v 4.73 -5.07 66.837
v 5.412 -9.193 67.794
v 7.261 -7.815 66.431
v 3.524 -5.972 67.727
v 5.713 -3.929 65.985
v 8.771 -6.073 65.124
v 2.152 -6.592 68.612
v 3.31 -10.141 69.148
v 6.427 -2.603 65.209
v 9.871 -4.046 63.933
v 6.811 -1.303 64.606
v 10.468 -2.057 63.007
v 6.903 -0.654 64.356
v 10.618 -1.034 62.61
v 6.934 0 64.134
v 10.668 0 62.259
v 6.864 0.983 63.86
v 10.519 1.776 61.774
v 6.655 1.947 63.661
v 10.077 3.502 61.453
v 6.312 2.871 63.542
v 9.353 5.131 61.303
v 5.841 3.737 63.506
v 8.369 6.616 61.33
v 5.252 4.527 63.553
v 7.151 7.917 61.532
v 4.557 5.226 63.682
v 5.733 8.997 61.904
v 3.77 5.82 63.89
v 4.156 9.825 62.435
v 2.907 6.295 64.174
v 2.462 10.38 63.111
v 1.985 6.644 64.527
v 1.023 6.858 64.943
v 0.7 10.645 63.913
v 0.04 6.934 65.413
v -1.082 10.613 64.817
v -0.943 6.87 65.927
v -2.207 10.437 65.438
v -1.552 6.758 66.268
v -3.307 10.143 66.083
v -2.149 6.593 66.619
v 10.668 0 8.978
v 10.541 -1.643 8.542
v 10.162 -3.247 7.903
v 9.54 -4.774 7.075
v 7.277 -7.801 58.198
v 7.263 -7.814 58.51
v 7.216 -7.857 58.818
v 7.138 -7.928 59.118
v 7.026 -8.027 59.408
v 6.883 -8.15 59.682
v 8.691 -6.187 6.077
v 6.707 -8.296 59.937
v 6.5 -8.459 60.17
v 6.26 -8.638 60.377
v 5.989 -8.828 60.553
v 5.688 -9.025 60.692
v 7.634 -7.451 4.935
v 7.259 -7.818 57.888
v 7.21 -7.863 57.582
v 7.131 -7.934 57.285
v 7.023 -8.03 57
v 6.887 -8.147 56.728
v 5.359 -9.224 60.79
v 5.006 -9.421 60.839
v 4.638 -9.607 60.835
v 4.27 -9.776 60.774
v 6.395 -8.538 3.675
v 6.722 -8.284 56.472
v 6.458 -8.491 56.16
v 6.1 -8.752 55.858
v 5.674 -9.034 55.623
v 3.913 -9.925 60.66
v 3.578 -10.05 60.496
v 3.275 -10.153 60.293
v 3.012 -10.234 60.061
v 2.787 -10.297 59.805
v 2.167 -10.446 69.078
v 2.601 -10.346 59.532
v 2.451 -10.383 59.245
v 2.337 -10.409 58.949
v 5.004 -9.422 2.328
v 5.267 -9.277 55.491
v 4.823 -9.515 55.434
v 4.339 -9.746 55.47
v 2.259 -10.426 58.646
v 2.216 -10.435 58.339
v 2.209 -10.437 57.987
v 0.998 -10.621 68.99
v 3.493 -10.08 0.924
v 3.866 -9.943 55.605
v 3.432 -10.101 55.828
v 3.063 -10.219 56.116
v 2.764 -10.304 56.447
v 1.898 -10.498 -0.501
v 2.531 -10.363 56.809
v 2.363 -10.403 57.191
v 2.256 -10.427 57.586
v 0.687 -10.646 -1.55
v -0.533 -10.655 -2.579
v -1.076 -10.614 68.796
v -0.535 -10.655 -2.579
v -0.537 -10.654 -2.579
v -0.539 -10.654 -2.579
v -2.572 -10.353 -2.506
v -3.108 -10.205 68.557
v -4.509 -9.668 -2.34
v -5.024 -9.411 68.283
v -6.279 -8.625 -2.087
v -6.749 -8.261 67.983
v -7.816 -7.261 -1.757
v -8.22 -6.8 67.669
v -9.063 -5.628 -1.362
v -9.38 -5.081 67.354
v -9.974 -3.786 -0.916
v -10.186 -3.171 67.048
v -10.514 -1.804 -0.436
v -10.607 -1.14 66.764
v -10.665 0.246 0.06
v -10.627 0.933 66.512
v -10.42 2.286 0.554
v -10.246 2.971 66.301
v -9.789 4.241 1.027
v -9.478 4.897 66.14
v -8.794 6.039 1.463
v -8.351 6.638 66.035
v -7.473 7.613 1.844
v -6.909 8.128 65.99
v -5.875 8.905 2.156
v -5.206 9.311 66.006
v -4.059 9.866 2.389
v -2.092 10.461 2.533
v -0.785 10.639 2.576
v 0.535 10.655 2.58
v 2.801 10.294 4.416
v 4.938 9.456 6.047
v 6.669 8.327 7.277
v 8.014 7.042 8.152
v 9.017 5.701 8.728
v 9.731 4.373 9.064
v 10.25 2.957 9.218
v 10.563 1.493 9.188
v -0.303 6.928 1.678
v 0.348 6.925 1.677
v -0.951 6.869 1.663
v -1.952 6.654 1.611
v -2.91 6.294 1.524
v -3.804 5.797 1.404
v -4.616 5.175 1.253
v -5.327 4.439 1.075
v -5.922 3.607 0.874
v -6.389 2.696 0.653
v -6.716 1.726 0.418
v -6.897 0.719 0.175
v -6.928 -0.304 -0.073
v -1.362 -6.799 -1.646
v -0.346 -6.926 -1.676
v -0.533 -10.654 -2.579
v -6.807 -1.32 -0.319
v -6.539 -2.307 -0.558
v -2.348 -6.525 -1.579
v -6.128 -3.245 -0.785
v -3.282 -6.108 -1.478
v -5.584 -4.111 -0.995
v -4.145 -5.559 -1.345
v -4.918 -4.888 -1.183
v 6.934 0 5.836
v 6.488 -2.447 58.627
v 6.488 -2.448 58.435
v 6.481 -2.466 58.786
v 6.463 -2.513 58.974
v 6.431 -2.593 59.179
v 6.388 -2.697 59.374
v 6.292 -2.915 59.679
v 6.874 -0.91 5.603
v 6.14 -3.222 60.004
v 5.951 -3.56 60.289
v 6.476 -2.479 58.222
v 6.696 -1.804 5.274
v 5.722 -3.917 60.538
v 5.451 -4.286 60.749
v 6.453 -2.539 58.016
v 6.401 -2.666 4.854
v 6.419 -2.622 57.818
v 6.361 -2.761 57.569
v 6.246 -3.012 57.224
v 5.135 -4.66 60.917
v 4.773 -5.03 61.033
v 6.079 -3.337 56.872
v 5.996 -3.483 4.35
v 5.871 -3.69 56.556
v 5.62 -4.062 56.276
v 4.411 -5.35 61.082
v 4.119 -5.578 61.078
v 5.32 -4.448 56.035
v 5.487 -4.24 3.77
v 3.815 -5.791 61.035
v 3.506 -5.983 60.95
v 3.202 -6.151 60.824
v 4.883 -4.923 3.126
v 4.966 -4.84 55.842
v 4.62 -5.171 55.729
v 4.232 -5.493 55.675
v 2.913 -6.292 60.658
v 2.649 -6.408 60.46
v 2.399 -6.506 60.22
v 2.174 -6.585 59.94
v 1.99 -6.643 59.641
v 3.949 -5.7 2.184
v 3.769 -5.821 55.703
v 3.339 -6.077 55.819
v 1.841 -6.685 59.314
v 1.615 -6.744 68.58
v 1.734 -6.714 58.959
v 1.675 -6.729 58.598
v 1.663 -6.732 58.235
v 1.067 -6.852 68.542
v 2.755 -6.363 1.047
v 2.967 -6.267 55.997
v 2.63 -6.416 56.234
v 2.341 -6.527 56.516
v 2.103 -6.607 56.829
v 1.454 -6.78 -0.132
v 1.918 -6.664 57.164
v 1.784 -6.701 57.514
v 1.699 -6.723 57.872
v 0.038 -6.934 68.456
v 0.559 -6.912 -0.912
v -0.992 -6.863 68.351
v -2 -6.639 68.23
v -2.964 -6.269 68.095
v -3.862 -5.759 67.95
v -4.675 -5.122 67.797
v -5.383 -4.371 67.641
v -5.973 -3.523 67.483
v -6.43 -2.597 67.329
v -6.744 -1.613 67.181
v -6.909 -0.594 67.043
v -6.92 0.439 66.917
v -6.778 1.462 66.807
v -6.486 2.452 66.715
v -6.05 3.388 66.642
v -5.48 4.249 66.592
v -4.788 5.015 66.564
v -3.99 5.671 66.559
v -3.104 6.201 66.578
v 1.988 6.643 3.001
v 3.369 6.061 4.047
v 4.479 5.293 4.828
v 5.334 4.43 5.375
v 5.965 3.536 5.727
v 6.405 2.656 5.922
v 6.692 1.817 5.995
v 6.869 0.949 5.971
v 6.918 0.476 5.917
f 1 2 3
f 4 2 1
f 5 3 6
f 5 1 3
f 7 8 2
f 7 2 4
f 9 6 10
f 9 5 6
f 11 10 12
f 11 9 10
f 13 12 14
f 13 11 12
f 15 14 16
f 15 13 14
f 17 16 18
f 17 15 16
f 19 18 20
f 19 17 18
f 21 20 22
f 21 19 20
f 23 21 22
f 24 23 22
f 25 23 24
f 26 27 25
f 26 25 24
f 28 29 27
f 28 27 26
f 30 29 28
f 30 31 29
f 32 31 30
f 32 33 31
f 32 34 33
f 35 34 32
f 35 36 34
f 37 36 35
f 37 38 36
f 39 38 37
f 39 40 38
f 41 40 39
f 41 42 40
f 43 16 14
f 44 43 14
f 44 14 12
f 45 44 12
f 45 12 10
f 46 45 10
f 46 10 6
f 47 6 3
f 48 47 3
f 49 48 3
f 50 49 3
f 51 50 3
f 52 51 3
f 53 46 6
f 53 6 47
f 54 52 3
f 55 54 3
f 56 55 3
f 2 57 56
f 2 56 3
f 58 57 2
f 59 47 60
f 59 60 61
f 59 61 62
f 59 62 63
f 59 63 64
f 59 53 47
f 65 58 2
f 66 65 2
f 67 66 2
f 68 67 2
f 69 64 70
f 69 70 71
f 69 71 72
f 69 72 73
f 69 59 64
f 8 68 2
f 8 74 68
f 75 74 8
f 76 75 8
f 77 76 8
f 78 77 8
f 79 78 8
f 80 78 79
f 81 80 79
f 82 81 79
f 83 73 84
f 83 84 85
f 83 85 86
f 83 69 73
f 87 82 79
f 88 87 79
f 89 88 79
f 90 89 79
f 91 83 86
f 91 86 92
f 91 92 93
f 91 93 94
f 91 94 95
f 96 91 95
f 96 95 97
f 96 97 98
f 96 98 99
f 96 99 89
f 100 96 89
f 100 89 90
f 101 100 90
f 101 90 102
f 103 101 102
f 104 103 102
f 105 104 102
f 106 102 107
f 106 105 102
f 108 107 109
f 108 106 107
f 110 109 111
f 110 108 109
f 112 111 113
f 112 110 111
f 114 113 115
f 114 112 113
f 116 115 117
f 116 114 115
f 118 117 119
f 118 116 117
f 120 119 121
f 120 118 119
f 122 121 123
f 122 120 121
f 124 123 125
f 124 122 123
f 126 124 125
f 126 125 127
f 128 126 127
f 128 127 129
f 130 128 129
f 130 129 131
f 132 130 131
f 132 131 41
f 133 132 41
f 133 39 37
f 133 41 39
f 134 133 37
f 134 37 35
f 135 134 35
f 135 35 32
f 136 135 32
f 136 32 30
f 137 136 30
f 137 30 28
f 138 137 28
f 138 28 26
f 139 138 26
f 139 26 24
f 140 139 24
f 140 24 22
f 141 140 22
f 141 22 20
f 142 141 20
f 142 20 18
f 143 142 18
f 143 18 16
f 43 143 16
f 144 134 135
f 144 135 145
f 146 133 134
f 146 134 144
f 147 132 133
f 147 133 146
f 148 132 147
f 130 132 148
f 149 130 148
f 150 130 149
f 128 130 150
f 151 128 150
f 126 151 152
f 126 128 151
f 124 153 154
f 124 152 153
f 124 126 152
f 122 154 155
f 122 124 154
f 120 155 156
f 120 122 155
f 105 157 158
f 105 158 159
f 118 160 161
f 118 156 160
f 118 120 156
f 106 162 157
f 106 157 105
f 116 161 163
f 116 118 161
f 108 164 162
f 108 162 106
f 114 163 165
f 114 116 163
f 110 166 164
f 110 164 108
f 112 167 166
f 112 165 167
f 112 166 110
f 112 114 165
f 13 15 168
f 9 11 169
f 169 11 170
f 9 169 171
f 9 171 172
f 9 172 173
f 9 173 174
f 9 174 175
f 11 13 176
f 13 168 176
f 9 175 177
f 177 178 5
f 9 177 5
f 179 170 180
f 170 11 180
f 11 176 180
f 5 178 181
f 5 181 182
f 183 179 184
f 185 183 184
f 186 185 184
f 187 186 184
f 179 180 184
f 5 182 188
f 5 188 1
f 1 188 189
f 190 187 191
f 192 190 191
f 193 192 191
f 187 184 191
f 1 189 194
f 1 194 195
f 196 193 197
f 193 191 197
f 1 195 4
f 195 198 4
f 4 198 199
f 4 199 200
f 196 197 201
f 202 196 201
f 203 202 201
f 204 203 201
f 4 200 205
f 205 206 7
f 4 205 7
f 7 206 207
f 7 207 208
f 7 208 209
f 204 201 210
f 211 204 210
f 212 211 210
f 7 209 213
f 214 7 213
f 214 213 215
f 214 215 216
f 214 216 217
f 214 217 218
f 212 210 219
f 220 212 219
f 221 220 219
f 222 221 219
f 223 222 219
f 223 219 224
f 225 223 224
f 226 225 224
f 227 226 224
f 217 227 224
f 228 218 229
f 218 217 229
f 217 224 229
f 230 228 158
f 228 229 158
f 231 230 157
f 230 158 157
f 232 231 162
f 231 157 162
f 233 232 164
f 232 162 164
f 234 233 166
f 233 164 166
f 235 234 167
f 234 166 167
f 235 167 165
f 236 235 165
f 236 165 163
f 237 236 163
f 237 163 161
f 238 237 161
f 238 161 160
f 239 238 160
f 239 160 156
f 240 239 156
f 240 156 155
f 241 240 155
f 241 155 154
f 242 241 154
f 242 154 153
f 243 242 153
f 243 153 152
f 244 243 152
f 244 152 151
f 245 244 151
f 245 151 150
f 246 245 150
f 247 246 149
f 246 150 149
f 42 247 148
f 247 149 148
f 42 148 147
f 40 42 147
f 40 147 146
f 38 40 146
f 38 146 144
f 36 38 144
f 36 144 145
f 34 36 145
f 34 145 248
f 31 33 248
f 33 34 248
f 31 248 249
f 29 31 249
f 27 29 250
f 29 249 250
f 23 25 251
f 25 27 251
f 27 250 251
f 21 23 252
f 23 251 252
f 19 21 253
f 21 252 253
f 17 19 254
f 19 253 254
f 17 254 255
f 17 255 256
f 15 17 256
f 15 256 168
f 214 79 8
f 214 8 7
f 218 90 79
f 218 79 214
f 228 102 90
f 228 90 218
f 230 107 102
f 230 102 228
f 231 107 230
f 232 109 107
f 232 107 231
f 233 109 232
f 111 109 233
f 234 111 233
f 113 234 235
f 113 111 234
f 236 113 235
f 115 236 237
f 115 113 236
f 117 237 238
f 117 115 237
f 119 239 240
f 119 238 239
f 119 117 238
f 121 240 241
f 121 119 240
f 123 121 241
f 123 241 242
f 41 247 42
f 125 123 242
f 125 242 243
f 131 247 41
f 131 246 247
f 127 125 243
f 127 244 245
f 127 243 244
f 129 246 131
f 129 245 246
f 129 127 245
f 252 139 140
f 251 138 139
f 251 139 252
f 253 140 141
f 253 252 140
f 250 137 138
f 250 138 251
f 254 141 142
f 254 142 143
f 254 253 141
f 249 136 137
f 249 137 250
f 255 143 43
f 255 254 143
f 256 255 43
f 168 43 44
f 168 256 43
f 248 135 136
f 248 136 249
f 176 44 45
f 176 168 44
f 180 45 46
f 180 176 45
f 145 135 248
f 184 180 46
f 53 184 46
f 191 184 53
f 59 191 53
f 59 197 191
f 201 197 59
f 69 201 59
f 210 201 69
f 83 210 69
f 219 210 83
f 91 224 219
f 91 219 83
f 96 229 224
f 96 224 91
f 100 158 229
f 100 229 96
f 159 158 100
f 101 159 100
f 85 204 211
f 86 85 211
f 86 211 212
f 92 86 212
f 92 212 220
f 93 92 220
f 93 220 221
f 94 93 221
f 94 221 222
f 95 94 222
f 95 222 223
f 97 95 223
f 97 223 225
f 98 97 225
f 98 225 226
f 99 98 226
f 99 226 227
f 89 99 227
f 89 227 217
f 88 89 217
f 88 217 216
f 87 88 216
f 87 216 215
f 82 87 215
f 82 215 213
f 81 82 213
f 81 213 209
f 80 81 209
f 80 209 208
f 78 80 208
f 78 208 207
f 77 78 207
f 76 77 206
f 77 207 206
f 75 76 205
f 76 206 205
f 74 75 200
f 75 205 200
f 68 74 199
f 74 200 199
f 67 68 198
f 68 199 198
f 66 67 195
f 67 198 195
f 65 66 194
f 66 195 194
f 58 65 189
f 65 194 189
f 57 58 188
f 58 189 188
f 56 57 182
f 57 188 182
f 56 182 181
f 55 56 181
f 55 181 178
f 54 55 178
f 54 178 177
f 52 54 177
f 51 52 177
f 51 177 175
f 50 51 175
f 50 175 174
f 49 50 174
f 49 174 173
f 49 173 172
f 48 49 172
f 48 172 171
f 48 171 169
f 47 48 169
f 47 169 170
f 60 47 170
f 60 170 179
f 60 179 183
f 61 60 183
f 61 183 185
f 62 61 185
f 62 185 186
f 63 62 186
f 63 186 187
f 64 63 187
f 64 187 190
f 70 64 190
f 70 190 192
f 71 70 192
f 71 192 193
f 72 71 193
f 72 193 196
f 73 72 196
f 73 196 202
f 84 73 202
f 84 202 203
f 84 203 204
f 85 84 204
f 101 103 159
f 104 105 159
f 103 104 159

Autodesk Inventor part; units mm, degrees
ref_plane "Start Plane" through (0, 0, -2.5789) normal (0, 0, 1) x (1, 0, 0)
ref_plane "End Plane" through (0, 0, 69.1479) normal (0, 0, 1) x (1, 0, 0)
sketch "Sketch" plane through (0, 0, 0) normal (0, 0, 1) x (1, 0, 0)
  circle A0 centre (0, 0) radius 6.9342
  circle A1 centre (0, 0) radius 10.668
  dimension "d0" = 21.336
  dimension "d1" = 3.7338
extrude "Body" add sketch "Sketch" along normal up to surface (71.7269 mm away) from surface at -2.5789
sketch "Sketch3" plane through (0, 0, 0) normal (0, 0, 1) x (1, 0, 0)
  line L0 (0, 0) -> (10, 0)
ref_plane "Work Plane3" through (0, 0, 0) normal (0, -1, 0) x (1, 0, 0)
sketch "Sketch4" plane through (0, 0, 0) normal (0, -1, 0) x (1, 0, 0)
  line L0 (-2, -2.5789) -> (12, -2.5789)
  line L1 (-2, 69.1479) -> (12, 69.1479)
  dimension "d7" = 71.7268
ref_plane "Work Plane4" through (6.5224, -8.4419, 69.2424) normal (-0.0922, 0.1193, 0.9886) x (0.9957, 0.0055, 0.0922)
split "Split1" plane through (6.5224, -8.4419, 69.2424) removes the side toward (-0.0922, 0.1193, 0.9886)
ref_plane "Work Plane5" through (-10.3791, -2.4658, -9.228) normal (0.6365, 0.1512, -0.7563) x (-0.6625, -0.395, -0.6365)
split "Split2" plane through (-10.3791, -2.4658, -9.228) removes the side toward (0.6365, 0.1512, -0.7563)
ref_plane "Work Plane6" through (0, -10.668, -2.5822) normal (0, 0.2353, -0.9719) x (1, 0, 0)
split "Split3" plane through (0, -10.668, -2.5822) removes the side toward (0, 0.2353, -0.9719)
ref_plane "Work Plane7" through (-9.0379, -5.6677, 73.9403) normal (0.432, 0.2709, 0.8602) x (0.8997, -0.0629, -0.432)
split "Split4" plane through (-9.0379, -5.6677, 73.9403) removes the side toward (0.432, 0.2709, 0.8602)
ref_plane "Work Plane8" through (8.1097, -16.9443, 26.4447) normal (0.1452, -0.9876, -0.059) x (0.0697, -0.0493, 0.9963)
sketch "Sketch5" plane through (8.1097, -16.9443, 26.4447) normal (0.1452, -0.9876, -0.059) x (0.0697, -0.0493, 0.9963)
  circle A0 centre (30.9821, 4.1171) radius 3 projected
  point P0 (-27.7483, 3.8509)
hole "Hole1" at (6.2064, -19.0834, 57.5677) direction (-0.1452, 0.9876, 0.059) diameter 5.4 depth 20 tip angle 118
equation "\"d0\" = G_H"
equation "\"d1\" = G_T"
equation "\"d2\" = G_L"
equation "\"G_H\" = 21.336"
equation "\"G_T\" = 3.7338"
equation "\"G_L\" = 71.72685"
equation "\"G_OFFSET_START\" = 2.57893"
equation "\"G_OFFSET_END\" = 1.53222"
equation "\"d4\" = -G_OFFSET_START"
equation "\"d5\" = G_OFFSET_END + B_L"
equation "\"B_L\" = 67.61571"
properties part number "ANSI - 1/2 x 0.147 - 2.824" material "Steel, Mild"
